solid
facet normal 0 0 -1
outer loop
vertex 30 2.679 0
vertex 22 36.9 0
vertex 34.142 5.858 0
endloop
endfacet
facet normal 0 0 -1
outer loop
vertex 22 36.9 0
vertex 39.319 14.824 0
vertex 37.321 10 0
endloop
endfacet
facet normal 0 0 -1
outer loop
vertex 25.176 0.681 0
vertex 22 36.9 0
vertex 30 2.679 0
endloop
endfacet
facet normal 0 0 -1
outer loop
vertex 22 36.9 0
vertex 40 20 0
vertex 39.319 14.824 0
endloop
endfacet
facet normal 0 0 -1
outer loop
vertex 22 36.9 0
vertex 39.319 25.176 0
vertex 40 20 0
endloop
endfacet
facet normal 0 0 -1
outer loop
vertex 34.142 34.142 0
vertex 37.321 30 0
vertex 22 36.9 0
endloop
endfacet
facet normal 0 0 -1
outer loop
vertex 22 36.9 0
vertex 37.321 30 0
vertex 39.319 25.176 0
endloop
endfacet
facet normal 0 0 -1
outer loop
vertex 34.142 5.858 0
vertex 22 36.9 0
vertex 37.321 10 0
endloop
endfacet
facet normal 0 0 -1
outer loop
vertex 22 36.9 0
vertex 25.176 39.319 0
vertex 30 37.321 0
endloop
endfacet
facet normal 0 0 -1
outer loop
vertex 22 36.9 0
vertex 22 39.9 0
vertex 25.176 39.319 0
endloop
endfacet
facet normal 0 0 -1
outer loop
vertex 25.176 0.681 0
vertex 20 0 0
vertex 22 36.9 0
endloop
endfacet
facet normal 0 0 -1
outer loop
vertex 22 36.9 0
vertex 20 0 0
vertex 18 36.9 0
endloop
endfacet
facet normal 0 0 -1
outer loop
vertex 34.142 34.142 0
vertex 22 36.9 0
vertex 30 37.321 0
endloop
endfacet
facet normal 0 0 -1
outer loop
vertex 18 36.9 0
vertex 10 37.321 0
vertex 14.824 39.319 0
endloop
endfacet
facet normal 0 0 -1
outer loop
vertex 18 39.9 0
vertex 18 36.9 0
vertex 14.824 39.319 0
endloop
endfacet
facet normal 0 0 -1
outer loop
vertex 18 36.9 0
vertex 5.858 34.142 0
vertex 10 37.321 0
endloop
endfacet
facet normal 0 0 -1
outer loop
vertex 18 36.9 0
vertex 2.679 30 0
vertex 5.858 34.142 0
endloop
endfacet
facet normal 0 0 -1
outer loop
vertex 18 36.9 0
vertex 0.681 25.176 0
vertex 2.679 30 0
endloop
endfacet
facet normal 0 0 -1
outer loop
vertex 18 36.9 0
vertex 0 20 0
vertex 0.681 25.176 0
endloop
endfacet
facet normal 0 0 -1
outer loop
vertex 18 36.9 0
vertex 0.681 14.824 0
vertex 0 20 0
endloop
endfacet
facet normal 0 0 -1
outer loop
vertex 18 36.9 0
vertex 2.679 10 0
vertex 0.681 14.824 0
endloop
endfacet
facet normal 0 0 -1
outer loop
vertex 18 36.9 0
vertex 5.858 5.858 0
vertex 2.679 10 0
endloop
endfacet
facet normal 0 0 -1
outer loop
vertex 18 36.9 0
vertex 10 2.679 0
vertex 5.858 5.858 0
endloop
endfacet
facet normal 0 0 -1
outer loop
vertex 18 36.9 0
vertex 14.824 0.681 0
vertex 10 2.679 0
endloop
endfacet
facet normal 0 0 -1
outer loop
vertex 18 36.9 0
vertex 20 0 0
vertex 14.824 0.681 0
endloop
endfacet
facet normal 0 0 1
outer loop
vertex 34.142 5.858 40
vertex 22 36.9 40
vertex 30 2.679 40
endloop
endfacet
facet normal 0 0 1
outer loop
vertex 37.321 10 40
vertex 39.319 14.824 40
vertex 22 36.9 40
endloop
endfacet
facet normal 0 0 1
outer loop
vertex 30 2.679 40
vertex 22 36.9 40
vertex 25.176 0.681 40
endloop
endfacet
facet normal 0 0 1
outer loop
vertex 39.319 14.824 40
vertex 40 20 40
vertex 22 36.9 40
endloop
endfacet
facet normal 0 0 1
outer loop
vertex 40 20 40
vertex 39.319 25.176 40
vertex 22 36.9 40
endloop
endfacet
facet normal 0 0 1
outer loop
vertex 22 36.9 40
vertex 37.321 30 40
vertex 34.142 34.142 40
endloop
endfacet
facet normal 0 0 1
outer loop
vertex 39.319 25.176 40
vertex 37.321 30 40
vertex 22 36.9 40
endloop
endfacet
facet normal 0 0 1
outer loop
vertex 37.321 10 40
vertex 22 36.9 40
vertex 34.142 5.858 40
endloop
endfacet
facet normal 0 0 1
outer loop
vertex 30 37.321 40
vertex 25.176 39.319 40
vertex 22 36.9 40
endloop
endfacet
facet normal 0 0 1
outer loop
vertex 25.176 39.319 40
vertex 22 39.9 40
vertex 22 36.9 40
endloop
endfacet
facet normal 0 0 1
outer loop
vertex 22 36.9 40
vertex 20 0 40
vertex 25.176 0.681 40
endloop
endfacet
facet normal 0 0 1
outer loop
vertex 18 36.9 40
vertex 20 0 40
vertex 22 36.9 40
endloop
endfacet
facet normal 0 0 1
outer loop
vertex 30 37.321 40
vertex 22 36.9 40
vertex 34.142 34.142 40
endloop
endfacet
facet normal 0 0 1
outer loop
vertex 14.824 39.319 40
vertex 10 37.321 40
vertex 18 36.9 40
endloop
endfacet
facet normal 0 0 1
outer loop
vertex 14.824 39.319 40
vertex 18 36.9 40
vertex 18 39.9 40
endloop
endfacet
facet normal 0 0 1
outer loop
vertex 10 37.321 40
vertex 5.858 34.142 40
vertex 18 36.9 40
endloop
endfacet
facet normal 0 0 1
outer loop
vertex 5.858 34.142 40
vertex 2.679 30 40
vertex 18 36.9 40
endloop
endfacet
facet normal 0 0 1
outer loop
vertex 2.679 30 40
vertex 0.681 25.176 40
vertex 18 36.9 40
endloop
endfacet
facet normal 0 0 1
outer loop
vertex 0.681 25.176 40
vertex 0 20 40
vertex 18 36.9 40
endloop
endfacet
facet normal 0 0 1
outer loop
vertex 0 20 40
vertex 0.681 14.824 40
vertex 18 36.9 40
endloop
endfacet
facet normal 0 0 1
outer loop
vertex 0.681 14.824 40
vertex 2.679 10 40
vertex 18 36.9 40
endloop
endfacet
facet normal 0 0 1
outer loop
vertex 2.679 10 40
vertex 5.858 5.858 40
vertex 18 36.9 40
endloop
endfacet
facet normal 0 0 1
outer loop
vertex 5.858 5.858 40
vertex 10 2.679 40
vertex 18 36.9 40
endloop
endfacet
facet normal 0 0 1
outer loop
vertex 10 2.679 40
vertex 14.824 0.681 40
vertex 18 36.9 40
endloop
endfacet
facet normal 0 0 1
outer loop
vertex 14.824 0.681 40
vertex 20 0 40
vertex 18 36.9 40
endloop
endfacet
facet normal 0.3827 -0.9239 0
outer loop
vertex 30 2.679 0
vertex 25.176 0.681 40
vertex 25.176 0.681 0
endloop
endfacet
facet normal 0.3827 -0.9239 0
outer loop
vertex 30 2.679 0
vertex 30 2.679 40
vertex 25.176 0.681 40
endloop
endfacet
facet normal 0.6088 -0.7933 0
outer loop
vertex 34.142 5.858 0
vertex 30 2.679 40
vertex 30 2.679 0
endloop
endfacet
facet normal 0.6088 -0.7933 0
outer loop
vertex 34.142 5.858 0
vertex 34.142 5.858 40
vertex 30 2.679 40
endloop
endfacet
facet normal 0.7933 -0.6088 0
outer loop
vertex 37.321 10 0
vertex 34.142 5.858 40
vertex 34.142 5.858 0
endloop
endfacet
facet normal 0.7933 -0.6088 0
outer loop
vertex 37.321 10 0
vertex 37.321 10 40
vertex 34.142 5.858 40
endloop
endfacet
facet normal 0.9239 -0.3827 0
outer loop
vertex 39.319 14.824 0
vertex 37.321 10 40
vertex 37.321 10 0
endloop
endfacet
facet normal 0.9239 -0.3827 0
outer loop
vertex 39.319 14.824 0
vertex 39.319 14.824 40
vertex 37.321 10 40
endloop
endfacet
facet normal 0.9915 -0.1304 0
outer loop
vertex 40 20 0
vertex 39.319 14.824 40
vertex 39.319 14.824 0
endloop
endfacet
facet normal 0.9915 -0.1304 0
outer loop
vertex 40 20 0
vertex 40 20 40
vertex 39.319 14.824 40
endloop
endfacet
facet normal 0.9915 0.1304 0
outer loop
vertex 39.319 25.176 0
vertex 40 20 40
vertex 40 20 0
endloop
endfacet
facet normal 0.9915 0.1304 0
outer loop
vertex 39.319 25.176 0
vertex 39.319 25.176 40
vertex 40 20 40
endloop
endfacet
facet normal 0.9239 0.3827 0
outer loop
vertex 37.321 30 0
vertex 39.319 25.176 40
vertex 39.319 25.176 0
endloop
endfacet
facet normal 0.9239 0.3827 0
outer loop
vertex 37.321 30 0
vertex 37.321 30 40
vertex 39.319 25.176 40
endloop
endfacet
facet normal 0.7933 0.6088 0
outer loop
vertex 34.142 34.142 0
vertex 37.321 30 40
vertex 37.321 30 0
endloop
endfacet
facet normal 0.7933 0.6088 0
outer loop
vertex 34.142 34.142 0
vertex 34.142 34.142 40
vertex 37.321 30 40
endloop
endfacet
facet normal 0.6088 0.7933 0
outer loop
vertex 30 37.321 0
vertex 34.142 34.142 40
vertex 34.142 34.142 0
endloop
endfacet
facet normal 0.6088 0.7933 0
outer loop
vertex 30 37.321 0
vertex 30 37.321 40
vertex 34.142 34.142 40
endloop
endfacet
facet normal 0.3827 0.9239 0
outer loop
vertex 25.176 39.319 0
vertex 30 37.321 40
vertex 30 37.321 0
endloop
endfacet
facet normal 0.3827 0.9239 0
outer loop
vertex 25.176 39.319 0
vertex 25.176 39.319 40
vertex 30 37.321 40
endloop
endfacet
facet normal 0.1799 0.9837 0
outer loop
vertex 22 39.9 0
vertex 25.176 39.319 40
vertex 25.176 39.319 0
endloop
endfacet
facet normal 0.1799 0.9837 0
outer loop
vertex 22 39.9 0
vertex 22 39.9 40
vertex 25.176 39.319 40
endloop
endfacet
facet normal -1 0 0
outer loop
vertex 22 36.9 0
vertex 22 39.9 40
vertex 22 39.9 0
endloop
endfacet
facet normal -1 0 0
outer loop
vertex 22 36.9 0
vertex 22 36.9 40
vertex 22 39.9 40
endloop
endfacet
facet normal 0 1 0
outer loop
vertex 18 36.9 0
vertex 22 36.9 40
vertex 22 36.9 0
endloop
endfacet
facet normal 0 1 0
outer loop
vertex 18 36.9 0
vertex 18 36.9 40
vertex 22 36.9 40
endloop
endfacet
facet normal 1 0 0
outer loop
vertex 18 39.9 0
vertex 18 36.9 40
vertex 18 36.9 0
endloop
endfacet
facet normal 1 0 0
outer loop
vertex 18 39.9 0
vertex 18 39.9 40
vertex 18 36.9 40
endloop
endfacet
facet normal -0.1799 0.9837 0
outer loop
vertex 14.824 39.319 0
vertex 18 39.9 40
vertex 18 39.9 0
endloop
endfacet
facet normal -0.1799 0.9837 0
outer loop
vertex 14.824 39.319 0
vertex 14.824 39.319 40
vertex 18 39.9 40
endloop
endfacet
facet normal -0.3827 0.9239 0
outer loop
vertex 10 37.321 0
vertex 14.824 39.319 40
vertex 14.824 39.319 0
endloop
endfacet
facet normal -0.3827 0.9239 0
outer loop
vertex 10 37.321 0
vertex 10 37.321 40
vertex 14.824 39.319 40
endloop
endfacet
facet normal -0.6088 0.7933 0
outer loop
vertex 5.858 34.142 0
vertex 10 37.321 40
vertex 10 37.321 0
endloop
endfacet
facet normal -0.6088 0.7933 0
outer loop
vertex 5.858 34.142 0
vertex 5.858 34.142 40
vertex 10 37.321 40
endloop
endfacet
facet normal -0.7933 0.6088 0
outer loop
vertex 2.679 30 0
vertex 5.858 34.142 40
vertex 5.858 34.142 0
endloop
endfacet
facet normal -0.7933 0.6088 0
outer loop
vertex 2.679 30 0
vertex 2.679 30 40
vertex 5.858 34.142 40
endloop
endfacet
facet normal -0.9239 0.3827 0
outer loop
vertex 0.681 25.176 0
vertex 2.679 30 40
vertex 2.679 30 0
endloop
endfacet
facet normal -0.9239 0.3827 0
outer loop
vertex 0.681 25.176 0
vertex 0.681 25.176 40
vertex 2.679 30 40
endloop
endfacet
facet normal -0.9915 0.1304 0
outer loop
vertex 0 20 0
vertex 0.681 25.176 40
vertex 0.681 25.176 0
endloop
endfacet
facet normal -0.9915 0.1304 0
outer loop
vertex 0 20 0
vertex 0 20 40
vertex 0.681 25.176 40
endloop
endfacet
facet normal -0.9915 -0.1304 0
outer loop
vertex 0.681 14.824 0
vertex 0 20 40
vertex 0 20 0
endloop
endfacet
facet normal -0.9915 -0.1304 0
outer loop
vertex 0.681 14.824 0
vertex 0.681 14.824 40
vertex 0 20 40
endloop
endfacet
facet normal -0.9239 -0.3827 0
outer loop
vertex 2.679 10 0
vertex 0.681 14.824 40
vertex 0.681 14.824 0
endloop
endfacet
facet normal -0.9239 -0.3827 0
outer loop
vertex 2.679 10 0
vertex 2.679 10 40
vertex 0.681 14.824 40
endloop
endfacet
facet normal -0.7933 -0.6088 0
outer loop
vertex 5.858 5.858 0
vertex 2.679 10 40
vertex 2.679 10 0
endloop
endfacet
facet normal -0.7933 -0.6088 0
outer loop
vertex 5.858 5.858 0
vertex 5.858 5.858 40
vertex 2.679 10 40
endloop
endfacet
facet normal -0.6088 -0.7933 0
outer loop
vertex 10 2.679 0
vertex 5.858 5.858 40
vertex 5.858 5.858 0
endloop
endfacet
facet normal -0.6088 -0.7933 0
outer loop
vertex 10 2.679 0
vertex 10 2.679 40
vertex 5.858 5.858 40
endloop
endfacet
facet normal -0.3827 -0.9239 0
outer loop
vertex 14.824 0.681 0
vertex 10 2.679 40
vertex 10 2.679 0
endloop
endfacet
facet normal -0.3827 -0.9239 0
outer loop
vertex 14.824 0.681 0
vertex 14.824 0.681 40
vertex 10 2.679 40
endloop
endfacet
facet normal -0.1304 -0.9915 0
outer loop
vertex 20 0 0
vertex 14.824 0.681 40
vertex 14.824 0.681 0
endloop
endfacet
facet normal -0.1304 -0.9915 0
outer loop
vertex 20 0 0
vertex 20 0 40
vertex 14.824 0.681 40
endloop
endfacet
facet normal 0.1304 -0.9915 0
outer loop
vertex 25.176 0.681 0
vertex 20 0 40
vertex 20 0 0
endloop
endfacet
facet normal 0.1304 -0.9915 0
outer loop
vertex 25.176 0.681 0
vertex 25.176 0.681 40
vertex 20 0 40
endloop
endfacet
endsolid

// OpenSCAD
$fn = 32;

// ----------------------------------------------------------------------
// Keyway shaft: d40 shaft, key 4 x 3 mm
// ----------------------------------------------------------------------

// --- parameters (mm) ---
shaft_r = 20;             // shaft radius
key_w = 4;                // keyway width
key_d = 3;                // keyway depth below the surface line
plate_t = 40;             // shaft length, Z (extrusion height)

shaft_d = 2 * shaft_r;  // shaft diameter
circle_step = 15;  // polygon sampling step, degrees

profile = [[14.824, 39.319], [10, 37.321], [5.858, 34.142], [2.679, 30], [0.681, 25.176], [0, 20], [0.681, 14.824], [2.679, 10], [5.858, 5.858], [10, 2.679], [14.824, 0.681], [20, 0], [25.176, 0.681], [30, 2.679], [34.142, 5.858], [37.321, 10], [39.319, 14.824], [40, 20], [39.319, 25.176], [37.321, 30], [34.142, 34.142], [30, 37.321], [25.176, 39.319], [22, 39.9], [22, 36.9], [18, 36.9], [18, 39.9]];  // primary outline, 27 points, counter clockwise

// --- the one profile operation ---
linear_extrude(height = plate_t) polygon(points = profile);
